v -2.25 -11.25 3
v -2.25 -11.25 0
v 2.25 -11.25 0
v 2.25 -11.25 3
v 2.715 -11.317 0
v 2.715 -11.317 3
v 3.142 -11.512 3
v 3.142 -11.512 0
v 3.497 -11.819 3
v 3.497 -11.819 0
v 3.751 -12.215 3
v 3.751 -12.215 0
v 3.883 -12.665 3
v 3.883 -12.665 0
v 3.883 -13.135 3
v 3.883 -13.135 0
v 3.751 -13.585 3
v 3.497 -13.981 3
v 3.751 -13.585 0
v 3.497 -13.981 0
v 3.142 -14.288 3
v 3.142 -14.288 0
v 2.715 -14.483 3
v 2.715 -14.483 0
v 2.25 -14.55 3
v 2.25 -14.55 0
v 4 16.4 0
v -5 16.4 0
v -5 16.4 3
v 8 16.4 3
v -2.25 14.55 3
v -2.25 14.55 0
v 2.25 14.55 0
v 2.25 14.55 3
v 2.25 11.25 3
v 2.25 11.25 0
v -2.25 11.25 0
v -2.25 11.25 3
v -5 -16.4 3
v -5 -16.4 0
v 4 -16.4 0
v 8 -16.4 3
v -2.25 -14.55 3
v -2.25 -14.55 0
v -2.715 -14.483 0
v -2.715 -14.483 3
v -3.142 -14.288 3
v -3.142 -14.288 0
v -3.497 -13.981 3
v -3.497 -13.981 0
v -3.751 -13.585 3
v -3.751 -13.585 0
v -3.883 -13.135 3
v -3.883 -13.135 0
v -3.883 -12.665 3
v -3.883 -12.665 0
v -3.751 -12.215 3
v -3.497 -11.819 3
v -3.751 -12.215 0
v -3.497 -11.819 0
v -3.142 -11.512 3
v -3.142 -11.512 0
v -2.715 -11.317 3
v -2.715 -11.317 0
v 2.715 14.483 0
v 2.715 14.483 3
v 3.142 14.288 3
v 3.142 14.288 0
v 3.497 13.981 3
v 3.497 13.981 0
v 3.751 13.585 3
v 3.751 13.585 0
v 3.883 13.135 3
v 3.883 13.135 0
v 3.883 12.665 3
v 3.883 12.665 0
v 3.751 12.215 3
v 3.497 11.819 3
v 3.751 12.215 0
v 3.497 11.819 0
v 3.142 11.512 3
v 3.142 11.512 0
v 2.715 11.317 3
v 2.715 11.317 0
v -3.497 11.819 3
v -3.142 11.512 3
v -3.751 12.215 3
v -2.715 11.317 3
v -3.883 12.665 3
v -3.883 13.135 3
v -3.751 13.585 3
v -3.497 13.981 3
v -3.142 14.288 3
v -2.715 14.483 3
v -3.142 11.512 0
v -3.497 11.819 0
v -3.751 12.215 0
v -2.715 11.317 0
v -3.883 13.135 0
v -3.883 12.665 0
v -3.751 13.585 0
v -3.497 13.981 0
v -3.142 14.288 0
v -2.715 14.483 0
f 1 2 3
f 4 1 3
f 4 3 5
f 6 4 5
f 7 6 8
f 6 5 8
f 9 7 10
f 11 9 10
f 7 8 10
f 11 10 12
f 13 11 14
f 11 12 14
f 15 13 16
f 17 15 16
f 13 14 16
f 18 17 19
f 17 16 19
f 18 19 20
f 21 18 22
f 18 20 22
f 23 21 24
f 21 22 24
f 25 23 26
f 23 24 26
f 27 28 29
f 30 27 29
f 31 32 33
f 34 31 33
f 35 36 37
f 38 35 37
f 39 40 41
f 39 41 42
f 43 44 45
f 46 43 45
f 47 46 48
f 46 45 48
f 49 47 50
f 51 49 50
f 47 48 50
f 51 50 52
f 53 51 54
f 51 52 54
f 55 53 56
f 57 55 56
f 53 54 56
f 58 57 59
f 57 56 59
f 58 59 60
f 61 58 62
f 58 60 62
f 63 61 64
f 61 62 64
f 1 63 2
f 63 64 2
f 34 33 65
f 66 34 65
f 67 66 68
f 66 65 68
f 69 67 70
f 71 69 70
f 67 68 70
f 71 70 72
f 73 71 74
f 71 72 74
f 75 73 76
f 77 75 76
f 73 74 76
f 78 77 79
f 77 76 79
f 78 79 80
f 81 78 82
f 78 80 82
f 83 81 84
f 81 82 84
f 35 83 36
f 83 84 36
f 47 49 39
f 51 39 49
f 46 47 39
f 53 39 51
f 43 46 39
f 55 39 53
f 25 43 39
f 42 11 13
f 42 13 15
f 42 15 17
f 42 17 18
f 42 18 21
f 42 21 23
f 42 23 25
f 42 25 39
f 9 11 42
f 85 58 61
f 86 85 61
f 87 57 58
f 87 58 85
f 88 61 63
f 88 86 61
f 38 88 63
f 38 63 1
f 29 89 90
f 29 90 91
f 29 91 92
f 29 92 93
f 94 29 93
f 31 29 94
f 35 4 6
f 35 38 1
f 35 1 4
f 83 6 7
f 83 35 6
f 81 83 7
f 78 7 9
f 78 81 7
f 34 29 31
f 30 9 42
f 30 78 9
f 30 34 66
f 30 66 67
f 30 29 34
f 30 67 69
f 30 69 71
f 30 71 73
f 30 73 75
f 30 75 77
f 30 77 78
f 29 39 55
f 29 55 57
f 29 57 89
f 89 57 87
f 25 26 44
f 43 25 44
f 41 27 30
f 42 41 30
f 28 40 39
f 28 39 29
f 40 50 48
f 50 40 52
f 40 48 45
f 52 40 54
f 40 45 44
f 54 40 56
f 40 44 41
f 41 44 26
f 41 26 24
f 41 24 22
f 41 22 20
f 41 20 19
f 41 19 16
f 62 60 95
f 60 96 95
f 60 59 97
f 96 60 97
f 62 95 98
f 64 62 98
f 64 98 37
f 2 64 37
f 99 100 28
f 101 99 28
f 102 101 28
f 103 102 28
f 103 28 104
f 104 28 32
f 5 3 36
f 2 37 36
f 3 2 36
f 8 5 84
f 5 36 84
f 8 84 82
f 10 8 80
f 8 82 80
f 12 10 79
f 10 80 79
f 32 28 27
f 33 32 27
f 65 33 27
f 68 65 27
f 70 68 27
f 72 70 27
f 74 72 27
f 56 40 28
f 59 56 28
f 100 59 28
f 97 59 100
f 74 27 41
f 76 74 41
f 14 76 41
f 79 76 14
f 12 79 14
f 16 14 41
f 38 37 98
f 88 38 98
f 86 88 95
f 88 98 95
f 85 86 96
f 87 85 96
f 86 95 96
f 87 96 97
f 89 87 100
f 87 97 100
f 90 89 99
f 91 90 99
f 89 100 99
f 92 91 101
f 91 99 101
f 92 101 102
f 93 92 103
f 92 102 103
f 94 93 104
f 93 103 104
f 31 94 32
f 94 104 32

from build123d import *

# Parameters (mm, degrees)
F0_W     = 13
F0_H     = 32.8
F1_DEPTH = 3
F3_DEPTH = 32.801


with BuildPart() as f1:
    # F0 (on Top) → F1 (new body)
    with BuildSketch(Plane.XY):
        with Locations((1.5, 0)):
            Rectangle(F0_W, F0_H)
        with BuildLine():
            Line((2.25, -14.55), (-2.25, -14.55))
            ThreePointArc((-2.25, -14.55), (-3.9, -12.9), (-2.25, -11.25))
            Line((-2.25, -11.25), (2.25, -11.25))
            ThreePointArc((2.25, -11.25), (3.9, -12.9), (2.25, -14.55))
        make_face(mode=Mode.SUBTRACT)
        with BuildLine():
            ThreePointArc((-2.25, 11.25), (-3.9, 12.9), (-2.25, 14.55))
            Line((-2.25, 14.55), (2.25, 14.55))
            ThreePointArc((2.25, 14.55), (3.9, 12.9), (2.25, 11.25))
            Line((2.25, 11.25), (-2.25, 11.25))
        make_face(mode=Mode.SUBTRACT)
    extrude(amount=F1_DEPTH)

    # F2 (on face) → F3 (cut, through all)
    with BuildSketch(Plane(origin=(0, 16.4, 0), x_dir=(-1, 0, 0), z_dir=(0, 1, 0))):
        Polygon((-4, 0), (-8, 3), (-8, 0), align=None)
    extrude(amount=-F3_DEPTH, mode=Mode.SUBTRACT)


solid = f1.part
